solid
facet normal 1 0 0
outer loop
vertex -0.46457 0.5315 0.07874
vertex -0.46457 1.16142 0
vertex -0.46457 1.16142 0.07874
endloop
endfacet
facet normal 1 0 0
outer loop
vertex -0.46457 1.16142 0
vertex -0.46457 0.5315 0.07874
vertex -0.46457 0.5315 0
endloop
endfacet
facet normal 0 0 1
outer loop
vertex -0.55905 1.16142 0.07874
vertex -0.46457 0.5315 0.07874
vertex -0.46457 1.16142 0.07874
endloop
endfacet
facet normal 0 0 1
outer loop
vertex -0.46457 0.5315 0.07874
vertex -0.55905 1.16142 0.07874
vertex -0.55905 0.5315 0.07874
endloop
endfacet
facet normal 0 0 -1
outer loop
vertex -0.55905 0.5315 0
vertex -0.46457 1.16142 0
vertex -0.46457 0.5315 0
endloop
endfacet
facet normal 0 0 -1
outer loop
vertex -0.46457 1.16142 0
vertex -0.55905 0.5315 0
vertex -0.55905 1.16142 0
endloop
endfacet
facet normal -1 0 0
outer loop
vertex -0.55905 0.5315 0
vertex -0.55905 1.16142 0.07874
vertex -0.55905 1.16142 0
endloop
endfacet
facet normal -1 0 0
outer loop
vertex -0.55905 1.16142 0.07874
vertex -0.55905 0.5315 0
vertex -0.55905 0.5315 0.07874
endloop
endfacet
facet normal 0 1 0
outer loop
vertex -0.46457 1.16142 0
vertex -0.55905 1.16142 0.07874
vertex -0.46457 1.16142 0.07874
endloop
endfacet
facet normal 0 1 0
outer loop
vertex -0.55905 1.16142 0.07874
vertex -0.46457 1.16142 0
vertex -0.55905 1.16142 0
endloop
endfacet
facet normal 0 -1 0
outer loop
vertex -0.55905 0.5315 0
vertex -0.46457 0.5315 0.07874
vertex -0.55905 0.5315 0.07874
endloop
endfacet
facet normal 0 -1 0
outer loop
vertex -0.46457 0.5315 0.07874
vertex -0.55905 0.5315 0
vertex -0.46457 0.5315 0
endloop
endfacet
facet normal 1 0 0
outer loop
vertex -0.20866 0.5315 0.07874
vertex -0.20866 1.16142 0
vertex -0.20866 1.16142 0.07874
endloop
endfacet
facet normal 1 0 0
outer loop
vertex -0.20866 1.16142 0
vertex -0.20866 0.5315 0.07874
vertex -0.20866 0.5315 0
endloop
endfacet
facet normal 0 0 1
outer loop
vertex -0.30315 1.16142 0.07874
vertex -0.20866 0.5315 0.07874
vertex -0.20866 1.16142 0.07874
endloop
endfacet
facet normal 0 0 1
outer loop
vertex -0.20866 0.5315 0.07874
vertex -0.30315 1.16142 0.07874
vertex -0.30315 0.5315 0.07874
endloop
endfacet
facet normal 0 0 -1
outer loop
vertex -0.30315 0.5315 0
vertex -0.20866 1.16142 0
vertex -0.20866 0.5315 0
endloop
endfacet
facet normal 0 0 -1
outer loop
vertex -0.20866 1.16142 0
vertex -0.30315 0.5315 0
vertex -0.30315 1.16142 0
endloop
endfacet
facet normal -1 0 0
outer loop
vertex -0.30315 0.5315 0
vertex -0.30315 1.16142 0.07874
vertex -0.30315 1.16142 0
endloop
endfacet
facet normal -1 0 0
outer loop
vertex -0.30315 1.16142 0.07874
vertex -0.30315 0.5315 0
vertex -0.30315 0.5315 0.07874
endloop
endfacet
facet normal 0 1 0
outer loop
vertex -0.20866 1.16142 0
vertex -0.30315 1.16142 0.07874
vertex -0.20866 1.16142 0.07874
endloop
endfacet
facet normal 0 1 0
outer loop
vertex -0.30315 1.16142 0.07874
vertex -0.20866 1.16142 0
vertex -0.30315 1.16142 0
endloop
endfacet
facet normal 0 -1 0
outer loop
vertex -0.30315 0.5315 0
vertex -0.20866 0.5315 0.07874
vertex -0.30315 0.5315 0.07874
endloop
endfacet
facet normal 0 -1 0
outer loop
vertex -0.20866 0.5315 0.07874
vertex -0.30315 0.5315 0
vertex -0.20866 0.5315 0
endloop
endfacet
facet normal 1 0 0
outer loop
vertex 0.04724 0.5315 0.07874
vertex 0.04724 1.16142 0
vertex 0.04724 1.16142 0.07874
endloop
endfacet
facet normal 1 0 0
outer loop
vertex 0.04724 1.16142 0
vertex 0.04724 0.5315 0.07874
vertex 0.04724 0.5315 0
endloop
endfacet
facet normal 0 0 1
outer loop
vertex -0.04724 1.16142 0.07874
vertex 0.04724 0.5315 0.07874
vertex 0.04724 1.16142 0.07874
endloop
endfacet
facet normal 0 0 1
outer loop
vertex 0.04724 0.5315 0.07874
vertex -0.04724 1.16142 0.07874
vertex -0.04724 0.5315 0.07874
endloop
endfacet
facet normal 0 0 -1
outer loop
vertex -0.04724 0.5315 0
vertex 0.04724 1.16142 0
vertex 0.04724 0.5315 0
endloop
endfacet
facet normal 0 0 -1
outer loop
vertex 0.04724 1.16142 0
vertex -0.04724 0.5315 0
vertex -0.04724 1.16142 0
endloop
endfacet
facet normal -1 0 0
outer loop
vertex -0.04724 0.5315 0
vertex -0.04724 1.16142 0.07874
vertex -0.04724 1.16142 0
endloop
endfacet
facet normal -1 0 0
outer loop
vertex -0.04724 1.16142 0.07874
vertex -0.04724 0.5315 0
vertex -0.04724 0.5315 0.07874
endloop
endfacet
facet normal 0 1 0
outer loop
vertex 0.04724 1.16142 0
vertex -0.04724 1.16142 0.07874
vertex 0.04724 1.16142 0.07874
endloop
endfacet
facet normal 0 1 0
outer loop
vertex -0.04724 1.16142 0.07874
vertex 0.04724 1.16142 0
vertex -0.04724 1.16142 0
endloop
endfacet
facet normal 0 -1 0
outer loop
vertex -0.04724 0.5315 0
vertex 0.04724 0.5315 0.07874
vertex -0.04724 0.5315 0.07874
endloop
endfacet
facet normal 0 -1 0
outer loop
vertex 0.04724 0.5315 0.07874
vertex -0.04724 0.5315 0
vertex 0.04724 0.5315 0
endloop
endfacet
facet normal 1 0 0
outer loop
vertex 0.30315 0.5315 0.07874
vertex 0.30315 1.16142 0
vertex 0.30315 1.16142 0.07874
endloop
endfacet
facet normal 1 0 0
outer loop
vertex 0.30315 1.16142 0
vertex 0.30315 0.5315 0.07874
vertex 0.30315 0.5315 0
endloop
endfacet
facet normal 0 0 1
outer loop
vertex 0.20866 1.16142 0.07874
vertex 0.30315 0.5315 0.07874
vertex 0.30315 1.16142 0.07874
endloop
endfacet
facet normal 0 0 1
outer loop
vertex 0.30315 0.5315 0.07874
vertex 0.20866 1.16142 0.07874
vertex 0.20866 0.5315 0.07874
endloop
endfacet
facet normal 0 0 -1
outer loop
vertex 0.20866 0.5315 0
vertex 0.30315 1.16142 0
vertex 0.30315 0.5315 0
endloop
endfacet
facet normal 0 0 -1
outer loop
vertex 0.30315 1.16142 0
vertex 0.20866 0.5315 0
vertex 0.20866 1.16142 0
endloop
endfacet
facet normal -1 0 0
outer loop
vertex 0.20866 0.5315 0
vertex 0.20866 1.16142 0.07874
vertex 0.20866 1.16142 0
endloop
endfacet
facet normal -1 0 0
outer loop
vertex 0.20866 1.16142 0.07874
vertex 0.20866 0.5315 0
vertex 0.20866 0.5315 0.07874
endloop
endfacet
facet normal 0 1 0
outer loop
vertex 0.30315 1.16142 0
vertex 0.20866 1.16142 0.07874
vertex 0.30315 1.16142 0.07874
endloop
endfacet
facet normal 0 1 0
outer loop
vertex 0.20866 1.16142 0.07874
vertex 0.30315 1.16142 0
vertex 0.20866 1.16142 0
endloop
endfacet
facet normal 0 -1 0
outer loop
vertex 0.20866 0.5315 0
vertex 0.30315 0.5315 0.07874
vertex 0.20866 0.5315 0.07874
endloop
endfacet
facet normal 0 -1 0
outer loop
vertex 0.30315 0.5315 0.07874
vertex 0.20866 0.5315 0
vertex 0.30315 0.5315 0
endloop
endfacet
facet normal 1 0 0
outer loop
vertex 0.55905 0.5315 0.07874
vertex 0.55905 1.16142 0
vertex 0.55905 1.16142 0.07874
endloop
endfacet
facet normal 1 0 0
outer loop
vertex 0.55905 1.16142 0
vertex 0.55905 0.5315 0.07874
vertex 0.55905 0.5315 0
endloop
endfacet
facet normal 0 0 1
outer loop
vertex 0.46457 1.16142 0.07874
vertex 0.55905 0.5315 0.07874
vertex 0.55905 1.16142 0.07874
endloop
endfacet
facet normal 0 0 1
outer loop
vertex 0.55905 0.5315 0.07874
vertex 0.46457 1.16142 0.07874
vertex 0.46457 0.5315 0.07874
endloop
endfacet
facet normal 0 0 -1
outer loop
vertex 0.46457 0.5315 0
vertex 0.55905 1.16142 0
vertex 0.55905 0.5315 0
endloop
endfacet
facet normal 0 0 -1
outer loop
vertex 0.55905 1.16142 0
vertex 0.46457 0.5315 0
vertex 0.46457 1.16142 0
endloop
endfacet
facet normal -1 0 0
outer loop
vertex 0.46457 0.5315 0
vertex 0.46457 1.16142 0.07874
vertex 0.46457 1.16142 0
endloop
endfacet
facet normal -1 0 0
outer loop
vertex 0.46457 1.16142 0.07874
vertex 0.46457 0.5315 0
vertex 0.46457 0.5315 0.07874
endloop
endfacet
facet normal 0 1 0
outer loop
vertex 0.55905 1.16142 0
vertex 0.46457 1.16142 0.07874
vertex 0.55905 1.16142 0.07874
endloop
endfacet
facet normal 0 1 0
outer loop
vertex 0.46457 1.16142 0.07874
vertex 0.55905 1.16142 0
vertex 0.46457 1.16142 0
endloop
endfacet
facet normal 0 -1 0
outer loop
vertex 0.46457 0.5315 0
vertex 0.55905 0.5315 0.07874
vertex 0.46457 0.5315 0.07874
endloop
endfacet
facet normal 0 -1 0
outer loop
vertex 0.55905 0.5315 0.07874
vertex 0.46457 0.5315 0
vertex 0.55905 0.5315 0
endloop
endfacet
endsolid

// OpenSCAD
// file: defines.scad
// example012.stl is Mblock.stl, (c) 2009 Will Langford
// licensed under the Creative Commons - GNU GPL license.
// http://www.thingiverse.com/thing:753

//import("sim800c.stl", convexity=3);

// PCB

$fn = 64;

scale = 1/2.54;
// main file
include <defines.scad>


Pin_w = 0.24;
Pin_h = 1.60;
Pin_u = 0.2;

// Смещение края вывода относительно оси
Pin_edge = 5.10 - 2.15;

module Pin() {
  translate([-Pin_w/2, Pin_edge-Pin_h, 0]) cube([Pin_w, Pin_h, Pin_u], center=false);

}

// Pins
scale(scale) color("Silver") {
  translate([-1.30, 0, 0]) Pin();
  translate([-0.65, 0, 0]) Pin();
  Pin();
  translate([0.65, 0, 0]) Pin();
  translate([1.30, 0, 0]) Pin();

}
